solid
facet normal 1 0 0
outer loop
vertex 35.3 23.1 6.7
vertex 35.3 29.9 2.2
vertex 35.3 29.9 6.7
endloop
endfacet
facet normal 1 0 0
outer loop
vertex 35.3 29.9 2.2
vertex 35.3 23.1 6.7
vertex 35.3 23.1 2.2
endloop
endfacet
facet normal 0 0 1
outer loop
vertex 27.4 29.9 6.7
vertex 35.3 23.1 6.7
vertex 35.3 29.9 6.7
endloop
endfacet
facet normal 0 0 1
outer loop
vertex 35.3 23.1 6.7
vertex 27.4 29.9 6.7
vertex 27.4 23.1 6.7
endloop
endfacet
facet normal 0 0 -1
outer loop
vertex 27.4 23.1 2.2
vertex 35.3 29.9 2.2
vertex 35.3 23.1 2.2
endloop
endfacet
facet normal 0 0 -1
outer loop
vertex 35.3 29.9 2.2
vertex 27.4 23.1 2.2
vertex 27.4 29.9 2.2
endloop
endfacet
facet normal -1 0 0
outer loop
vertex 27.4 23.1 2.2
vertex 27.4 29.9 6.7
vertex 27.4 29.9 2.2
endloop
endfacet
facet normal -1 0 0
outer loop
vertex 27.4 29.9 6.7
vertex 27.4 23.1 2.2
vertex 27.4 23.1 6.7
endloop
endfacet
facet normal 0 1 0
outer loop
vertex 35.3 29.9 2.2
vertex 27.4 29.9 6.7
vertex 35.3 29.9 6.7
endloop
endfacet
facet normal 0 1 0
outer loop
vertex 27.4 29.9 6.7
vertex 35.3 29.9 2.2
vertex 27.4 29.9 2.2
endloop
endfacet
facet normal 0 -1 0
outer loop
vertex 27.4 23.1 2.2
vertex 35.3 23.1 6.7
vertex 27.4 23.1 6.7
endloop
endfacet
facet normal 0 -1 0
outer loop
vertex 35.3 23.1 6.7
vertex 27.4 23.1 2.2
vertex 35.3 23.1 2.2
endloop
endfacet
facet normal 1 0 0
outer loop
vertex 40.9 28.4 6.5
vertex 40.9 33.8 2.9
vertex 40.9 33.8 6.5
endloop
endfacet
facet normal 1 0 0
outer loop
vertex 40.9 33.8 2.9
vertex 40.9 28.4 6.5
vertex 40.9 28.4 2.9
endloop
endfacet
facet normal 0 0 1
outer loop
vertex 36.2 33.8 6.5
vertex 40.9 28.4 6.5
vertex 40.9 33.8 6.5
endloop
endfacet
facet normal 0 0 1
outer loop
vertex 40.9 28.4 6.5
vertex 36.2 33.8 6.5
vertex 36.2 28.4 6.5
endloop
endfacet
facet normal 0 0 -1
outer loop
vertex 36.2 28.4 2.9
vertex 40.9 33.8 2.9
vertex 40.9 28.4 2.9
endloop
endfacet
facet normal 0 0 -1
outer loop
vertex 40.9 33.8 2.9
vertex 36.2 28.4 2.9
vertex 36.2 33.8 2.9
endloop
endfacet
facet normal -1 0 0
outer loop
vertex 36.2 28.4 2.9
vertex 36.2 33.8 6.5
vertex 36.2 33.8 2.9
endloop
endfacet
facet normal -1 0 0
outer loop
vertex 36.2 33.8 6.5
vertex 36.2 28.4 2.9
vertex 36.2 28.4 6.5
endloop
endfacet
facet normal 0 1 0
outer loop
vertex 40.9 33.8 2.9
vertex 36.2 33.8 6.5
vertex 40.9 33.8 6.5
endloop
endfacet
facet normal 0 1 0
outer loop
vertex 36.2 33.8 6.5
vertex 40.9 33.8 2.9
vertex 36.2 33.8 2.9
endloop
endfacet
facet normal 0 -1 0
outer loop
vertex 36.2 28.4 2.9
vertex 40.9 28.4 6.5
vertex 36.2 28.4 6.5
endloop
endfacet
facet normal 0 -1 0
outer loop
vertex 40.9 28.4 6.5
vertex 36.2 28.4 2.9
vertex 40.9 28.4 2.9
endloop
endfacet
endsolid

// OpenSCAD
union() {
  translate([27.4, 23.1, 2.2]) cube(size=[7.9,6.8,4.5], center=false);
  translate([36.2, 28.4, 2.9]) cube(size=[4.7,5.4,3.6], center=false);
}
